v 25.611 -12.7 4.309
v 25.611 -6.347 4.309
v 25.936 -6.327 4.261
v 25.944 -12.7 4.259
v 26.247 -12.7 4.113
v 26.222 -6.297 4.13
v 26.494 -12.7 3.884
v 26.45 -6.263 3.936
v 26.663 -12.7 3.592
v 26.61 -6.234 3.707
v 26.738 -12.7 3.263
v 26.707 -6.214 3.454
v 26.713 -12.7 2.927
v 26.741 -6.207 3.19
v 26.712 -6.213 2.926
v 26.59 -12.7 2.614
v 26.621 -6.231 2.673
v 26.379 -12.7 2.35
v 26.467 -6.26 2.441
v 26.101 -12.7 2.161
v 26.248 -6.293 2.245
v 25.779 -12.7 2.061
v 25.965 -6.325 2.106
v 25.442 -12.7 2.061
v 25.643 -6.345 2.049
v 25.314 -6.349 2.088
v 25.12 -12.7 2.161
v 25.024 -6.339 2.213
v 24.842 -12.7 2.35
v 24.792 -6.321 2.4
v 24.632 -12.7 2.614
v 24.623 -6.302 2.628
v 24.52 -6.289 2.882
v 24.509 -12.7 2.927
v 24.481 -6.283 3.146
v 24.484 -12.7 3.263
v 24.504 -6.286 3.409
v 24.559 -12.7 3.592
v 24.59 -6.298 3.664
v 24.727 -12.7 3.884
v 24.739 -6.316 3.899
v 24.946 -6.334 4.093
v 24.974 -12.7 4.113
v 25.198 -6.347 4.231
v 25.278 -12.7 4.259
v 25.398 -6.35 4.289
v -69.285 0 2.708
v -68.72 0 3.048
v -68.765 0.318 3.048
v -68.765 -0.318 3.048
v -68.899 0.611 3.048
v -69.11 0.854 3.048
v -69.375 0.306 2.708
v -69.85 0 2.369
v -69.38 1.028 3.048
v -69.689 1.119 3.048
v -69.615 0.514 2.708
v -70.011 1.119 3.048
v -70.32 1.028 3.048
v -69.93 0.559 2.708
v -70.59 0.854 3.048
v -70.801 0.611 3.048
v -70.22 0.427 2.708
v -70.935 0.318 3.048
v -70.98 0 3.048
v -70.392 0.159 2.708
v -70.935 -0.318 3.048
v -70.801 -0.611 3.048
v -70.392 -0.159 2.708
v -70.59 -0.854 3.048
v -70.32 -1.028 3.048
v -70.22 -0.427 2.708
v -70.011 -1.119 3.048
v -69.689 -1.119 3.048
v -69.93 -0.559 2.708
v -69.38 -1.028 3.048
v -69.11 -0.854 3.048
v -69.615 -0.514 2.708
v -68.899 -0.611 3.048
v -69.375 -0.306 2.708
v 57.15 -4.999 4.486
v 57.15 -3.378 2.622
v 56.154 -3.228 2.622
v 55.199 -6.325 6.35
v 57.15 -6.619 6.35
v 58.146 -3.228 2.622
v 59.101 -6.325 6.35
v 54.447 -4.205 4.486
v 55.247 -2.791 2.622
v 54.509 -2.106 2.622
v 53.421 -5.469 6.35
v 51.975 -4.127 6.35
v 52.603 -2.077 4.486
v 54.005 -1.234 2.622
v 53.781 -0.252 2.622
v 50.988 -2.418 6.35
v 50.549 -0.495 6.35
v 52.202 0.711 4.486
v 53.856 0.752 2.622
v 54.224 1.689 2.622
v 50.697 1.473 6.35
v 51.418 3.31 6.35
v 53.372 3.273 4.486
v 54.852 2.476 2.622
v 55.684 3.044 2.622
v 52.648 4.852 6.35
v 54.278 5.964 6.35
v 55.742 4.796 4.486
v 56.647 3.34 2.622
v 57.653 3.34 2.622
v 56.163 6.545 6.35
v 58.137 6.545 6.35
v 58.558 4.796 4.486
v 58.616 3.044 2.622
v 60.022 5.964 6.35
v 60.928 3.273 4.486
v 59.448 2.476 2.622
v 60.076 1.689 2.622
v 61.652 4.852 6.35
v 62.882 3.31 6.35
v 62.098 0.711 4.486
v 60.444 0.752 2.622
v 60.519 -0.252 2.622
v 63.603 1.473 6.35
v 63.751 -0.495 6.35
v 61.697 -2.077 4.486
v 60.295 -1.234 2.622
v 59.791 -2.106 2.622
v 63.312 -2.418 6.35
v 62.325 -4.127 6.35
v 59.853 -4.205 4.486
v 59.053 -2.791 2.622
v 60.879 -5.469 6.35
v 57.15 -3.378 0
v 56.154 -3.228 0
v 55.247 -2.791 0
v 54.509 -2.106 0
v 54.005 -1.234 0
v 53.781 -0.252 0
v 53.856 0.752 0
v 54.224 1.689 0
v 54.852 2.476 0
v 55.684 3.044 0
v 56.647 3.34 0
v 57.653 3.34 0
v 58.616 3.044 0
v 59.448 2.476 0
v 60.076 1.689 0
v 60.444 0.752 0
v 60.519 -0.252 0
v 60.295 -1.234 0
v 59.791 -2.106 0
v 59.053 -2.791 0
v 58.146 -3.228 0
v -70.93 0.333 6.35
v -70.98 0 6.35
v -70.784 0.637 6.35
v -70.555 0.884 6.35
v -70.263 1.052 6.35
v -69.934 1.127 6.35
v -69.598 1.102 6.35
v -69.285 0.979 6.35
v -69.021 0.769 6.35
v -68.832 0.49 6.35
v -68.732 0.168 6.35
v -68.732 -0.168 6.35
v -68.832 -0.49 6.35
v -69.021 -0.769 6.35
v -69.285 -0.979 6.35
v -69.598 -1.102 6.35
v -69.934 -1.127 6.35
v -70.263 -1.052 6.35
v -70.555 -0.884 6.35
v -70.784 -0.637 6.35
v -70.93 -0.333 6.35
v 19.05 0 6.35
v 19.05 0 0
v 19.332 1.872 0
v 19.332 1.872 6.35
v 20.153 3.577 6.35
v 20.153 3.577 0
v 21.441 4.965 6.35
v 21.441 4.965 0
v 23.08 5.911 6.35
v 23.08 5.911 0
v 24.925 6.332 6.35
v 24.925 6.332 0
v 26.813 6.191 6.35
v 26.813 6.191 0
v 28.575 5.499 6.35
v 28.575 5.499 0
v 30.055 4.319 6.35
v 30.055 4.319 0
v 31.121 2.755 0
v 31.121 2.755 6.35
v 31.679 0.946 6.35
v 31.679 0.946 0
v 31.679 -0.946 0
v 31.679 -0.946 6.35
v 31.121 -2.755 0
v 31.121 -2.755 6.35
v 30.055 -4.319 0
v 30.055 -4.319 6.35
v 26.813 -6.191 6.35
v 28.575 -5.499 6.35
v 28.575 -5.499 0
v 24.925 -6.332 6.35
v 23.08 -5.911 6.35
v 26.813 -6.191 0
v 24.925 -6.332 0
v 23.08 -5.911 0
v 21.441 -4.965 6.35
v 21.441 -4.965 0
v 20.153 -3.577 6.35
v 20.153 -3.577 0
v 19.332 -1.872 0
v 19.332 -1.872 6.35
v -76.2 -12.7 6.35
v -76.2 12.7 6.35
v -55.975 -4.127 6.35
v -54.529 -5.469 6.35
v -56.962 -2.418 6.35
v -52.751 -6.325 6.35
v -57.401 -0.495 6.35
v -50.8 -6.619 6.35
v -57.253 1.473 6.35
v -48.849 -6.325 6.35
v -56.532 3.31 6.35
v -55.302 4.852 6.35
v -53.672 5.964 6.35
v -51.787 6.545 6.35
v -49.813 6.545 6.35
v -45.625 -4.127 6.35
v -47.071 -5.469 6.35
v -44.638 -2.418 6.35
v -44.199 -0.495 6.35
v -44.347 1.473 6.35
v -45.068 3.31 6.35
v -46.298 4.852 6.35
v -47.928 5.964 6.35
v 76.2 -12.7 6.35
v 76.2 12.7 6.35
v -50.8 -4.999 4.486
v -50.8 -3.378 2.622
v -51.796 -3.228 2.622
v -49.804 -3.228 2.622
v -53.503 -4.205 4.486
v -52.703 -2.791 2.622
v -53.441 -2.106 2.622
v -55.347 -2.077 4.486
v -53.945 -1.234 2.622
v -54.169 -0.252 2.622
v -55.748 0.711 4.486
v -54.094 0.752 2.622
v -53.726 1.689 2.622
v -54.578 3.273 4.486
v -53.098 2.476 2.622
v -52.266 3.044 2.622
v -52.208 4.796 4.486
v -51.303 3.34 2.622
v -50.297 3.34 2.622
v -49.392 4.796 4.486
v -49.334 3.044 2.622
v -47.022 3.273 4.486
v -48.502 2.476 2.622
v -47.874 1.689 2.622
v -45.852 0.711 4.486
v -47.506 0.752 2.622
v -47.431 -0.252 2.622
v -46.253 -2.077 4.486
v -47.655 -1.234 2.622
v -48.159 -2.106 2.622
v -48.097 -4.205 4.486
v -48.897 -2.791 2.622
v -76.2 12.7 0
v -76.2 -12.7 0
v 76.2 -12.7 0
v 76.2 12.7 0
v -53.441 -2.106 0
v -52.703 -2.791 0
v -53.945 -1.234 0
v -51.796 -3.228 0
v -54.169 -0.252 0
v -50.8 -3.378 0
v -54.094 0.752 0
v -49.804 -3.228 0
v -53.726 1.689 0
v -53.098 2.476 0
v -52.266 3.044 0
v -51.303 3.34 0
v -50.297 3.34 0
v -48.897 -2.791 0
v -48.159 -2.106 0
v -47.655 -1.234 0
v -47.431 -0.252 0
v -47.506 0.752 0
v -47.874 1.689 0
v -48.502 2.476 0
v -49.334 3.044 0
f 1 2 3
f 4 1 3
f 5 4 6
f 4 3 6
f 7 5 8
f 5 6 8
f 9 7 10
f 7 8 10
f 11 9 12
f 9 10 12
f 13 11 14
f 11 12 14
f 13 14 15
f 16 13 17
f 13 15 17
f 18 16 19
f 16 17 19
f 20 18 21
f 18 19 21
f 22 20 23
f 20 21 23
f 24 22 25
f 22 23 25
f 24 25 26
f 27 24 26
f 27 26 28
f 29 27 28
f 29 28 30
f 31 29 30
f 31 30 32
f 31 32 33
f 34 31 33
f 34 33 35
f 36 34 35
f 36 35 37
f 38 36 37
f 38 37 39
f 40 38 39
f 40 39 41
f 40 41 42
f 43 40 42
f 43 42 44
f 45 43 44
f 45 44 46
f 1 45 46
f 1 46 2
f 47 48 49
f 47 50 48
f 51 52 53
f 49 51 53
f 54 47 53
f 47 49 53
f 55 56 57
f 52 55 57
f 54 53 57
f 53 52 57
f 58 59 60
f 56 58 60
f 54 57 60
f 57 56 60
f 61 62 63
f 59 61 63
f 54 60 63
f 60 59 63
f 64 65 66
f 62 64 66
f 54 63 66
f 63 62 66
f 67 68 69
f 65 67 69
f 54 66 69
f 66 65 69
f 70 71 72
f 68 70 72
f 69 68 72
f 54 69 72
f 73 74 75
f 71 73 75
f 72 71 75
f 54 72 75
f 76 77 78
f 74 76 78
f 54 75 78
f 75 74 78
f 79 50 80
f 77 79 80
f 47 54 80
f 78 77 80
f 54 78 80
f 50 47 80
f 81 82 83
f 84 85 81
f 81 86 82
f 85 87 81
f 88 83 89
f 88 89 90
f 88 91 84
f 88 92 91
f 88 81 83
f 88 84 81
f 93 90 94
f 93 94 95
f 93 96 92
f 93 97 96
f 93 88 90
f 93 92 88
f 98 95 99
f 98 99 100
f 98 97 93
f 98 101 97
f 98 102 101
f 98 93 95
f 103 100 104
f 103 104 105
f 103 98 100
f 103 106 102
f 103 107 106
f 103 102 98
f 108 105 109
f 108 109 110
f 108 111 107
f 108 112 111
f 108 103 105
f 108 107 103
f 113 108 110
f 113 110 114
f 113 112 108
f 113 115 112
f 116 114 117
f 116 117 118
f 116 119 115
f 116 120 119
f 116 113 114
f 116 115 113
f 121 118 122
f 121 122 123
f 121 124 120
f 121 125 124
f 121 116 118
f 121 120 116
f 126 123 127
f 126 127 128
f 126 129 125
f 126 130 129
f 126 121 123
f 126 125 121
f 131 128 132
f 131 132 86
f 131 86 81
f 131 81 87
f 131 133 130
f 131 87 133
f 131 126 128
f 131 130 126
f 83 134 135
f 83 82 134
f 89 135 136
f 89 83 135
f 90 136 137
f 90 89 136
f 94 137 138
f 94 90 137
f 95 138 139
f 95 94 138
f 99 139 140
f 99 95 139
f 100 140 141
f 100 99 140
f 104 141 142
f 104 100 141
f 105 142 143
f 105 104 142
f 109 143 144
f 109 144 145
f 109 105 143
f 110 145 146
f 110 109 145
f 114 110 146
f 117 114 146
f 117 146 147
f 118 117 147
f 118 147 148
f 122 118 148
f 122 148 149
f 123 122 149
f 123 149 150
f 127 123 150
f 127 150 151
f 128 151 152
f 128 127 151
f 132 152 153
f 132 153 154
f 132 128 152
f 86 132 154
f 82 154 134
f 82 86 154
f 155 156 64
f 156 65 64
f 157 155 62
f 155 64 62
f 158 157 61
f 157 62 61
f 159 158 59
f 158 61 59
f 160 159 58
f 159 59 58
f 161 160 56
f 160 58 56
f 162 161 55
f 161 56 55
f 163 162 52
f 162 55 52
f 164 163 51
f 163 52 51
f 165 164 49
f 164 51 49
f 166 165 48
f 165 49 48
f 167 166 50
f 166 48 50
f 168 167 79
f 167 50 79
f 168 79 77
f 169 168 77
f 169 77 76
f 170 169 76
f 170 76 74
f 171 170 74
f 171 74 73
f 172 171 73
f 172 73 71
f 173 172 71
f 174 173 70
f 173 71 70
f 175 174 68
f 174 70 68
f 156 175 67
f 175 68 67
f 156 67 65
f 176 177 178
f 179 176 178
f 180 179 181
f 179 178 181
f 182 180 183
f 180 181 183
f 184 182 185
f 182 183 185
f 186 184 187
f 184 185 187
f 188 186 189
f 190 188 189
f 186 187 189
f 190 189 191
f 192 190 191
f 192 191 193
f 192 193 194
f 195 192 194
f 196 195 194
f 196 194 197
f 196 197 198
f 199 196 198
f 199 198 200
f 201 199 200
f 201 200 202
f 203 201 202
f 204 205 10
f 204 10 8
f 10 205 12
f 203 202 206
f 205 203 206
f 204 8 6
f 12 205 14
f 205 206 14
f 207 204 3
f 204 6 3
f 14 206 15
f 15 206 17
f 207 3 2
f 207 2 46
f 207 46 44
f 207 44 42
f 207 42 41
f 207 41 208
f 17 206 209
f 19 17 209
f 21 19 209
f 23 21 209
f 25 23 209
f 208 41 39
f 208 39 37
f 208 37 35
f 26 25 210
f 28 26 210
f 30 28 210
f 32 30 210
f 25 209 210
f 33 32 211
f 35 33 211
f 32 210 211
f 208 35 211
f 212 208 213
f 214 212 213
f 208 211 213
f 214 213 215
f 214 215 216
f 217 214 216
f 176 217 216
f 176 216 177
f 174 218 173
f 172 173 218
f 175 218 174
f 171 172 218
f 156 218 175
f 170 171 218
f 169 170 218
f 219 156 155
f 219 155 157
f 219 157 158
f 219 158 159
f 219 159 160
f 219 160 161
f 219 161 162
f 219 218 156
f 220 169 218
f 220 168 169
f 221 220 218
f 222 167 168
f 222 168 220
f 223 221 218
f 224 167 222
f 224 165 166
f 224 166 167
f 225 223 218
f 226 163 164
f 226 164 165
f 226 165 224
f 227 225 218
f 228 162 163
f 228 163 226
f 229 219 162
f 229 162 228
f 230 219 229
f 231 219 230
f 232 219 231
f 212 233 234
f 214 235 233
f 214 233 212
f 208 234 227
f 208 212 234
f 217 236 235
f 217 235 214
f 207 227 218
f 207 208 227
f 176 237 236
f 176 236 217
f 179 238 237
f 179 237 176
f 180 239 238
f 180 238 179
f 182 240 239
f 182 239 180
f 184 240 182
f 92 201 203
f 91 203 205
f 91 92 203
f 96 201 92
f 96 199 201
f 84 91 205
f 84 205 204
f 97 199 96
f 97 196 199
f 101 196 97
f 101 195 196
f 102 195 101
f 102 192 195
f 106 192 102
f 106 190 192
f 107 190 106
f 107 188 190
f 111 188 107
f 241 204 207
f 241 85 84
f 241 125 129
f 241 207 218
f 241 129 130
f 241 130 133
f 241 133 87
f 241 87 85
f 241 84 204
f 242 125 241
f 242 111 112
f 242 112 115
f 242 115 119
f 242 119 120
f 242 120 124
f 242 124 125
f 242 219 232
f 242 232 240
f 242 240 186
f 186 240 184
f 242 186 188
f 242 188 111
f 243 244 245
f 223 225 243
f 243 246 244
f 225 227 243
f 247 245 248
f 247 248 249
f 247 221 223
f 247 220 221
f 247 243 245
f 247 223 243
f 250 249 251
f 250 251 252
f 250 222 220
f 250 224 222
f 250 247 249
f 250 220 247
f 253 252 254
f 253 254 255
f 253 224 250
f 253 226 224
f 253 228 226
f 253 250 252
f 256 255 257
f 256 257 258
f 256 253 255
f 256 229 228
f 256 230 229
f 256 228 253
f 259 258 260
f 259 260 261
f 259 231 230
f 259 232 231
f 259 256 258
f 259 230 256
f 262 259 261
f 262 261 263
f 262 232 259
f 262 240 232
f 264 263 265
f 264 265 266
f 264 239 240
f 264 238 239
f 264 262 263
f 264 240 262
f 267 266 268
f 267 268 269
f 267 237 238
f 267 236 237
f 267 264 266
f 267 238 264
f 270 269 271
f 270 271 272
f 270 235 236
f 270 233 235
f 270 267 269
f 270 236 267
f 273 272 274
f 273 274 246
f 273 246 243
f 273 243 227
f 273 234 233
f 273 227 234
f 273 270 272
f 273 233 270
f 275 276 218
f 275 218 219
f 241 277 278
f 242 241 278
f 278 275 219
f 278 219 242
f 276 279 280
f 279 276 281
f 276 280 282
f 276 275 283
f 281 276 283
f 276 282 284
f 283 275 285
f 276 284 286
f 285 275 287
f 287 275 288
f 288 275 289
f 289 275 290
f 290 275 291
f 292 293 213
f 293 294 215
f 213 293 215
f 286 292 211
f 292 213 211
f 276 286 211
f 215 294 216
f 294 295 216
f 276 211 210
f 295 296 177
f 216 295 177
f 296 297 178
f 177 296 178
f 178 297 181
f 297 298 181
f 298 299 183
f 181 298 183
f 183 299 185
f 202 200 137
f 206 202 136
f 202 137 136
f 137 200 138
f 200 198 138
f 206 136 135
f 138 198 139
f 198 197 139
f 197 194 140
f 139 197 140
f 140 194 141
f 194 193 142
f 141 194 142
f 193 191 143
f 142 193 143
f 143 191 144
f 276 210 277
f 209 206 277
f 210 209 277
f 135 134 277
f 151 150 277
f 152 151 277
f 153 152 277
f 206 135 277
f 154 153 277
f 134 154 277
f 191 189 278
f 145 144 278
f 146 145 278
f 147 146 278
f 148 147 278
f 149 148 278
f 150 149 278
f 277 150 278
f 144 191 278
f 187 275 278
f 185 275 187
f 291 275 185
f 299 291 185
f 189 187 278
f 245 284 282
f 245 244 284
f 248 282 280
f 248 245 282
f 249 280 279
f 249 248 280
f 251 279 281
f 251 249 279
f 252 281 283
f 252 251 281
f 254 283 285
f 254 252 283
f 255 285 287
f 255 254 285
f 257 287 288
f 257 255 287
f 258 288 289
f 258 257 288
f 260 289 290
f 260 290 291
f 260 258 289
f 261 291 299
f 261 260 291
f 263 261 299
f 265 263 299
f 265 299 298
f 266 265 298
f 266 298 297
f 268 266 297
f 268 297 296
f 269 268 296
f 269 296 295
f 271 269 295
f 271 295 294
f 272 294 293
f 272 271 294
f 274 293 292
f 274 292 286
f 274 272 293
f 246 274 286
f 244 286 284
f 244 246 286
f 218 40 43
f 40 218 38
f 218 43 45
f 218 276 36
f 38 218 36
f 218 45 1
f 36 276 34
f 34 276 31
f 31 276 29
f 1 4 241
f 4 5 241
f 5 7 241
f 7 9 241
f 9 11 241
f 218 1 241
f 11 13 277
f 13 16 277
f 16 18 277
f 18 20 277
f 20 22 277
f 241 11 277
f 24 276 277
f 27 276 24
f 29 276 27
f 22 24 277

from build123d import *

# Parameters (mm, degrees)
SKETCH1_W                  = 152.4
SKETCH1_H                  = 25.4
EXTRUDE1_DEPTH             = 6.35
F_4_40_TAPPED_HOLE2_D      = 2.2606
F_4_40_TAPPED_HOLE2_DEPTH  = 3.302
F_4_40_TAPPED_HOLE2_TIP    = 0.679152758
F_1_2_0_5_DIAMETER_HOLE1_D = 12.7
F_4_40_TAPPED_HOLE3_D      = 2.2606
F_4_40_TAPPED_HOLE3_DEPTH  = 8.89
F_4_40_TAPPED_HOLE3_TIP    = 0.679152758


with BuildPart() as part:
    # Sketch1 → Extrude1 (new body)
    with BuildSketch(Plane.XY):
        Rectangle(SKETCH1_W, SKETCH1_H)
    extrude(amount=EXTRUDE1_DEPTH)

    # #4-40 Tapped Hole2
    with Locations(Plane(origin=(-69.85, 0, 6.35), x_dir=(1, 0, 0), z_dir=(0, 0, 1))):
        with Locations((0, 0)):
            Hole(F_4_40_TAPPED_HOLE2_D / 2, depth=F_4_40_TAPPED_HOLE2_DEPTH)
            with Locations((0, 0, -(F_4_40_TAPPED_HOLE2_DEPTH + F_4_40_TAPPED_HOLE2_TIP / 2))):  # 118° drill point
                Cone(0, F_4_40_TAPPED_HOLE2_D / 2, F_4_40_TAPPED_HOLE2_TIP, mode=Mode.SUBTRACT)

    # 1/2 (0.5) Diameter Hole1 (through all)
    with Locations(Plane(origin=(25.4, 0, 6.35), x_dir=(1, 0, 0), z_dir=(0, 0, 1))):
        with Locations((0, 0)):
            Hole(F_1_2_0_5_DIAMETER_HOLE1_D / 2)

    # #4-40 Tapped Hole3
    with Locations(Plane(origin=(25.610669662, -12.7, 3.178918451), x_dir=(0, 0, -1), z_dir=(0, -1, 0))):
        with Locations((0, 0)):
            Hole(F_4_40_TAPPED_HOLE3_D / 2, depth=F_4_40_TAPPED_HOLE3_DEPTH)
            with Locations((0, 0, -(F_4_40_TAPPED_HOLE3_DEPTH + F_4_40_TAPPED_HOLE3_TIP / 2))):  # 118° drill point
                Cone(0, F_4_40_TAPPED_HOLE3_D / 2, F_4_40_TAPPED_HOLE3_TIP, mode=Mode.SUBTRACT)

    # Sketch17 → CSK for 1/4 Flat Head Socket Cap Screw4 (revolve, cut)
    with BuildSketch(Plane(origin=(-50.8, 0, 6.35), x_dir=(0, -1, 0), z_dir=(1, 0, 0))):
        Polygon((0, 0), (0, 6.35), (3.3782, 6.35), (3.3782, 3.728390023), (6.61924, 0), align=None)
    revolve(axis=Axis((-50.8, 0, 12.7), (0, 0, -1)), mode=Mode.SUBTRACT)

    # Sketch19 → CSK for 1/4 Flat Head Socket Cap Screw5 (revolve, cut)
    with BuildSketch(Plane(origin=(57.15, 0, 6.35), x_dir=(0, -1, 0), z_dir=(1, 0, 0))):
        Polygon((0, 0), (0, 6.35), (3.3782, 6.35), (3.3782, 3.728390023), (6.61924, 0), align=None)
    revolve(axis=Axis((57.15, 0, 12.7), (0, 0, -1)), mode=Mode.SUBTRACT)


solid = part.part
